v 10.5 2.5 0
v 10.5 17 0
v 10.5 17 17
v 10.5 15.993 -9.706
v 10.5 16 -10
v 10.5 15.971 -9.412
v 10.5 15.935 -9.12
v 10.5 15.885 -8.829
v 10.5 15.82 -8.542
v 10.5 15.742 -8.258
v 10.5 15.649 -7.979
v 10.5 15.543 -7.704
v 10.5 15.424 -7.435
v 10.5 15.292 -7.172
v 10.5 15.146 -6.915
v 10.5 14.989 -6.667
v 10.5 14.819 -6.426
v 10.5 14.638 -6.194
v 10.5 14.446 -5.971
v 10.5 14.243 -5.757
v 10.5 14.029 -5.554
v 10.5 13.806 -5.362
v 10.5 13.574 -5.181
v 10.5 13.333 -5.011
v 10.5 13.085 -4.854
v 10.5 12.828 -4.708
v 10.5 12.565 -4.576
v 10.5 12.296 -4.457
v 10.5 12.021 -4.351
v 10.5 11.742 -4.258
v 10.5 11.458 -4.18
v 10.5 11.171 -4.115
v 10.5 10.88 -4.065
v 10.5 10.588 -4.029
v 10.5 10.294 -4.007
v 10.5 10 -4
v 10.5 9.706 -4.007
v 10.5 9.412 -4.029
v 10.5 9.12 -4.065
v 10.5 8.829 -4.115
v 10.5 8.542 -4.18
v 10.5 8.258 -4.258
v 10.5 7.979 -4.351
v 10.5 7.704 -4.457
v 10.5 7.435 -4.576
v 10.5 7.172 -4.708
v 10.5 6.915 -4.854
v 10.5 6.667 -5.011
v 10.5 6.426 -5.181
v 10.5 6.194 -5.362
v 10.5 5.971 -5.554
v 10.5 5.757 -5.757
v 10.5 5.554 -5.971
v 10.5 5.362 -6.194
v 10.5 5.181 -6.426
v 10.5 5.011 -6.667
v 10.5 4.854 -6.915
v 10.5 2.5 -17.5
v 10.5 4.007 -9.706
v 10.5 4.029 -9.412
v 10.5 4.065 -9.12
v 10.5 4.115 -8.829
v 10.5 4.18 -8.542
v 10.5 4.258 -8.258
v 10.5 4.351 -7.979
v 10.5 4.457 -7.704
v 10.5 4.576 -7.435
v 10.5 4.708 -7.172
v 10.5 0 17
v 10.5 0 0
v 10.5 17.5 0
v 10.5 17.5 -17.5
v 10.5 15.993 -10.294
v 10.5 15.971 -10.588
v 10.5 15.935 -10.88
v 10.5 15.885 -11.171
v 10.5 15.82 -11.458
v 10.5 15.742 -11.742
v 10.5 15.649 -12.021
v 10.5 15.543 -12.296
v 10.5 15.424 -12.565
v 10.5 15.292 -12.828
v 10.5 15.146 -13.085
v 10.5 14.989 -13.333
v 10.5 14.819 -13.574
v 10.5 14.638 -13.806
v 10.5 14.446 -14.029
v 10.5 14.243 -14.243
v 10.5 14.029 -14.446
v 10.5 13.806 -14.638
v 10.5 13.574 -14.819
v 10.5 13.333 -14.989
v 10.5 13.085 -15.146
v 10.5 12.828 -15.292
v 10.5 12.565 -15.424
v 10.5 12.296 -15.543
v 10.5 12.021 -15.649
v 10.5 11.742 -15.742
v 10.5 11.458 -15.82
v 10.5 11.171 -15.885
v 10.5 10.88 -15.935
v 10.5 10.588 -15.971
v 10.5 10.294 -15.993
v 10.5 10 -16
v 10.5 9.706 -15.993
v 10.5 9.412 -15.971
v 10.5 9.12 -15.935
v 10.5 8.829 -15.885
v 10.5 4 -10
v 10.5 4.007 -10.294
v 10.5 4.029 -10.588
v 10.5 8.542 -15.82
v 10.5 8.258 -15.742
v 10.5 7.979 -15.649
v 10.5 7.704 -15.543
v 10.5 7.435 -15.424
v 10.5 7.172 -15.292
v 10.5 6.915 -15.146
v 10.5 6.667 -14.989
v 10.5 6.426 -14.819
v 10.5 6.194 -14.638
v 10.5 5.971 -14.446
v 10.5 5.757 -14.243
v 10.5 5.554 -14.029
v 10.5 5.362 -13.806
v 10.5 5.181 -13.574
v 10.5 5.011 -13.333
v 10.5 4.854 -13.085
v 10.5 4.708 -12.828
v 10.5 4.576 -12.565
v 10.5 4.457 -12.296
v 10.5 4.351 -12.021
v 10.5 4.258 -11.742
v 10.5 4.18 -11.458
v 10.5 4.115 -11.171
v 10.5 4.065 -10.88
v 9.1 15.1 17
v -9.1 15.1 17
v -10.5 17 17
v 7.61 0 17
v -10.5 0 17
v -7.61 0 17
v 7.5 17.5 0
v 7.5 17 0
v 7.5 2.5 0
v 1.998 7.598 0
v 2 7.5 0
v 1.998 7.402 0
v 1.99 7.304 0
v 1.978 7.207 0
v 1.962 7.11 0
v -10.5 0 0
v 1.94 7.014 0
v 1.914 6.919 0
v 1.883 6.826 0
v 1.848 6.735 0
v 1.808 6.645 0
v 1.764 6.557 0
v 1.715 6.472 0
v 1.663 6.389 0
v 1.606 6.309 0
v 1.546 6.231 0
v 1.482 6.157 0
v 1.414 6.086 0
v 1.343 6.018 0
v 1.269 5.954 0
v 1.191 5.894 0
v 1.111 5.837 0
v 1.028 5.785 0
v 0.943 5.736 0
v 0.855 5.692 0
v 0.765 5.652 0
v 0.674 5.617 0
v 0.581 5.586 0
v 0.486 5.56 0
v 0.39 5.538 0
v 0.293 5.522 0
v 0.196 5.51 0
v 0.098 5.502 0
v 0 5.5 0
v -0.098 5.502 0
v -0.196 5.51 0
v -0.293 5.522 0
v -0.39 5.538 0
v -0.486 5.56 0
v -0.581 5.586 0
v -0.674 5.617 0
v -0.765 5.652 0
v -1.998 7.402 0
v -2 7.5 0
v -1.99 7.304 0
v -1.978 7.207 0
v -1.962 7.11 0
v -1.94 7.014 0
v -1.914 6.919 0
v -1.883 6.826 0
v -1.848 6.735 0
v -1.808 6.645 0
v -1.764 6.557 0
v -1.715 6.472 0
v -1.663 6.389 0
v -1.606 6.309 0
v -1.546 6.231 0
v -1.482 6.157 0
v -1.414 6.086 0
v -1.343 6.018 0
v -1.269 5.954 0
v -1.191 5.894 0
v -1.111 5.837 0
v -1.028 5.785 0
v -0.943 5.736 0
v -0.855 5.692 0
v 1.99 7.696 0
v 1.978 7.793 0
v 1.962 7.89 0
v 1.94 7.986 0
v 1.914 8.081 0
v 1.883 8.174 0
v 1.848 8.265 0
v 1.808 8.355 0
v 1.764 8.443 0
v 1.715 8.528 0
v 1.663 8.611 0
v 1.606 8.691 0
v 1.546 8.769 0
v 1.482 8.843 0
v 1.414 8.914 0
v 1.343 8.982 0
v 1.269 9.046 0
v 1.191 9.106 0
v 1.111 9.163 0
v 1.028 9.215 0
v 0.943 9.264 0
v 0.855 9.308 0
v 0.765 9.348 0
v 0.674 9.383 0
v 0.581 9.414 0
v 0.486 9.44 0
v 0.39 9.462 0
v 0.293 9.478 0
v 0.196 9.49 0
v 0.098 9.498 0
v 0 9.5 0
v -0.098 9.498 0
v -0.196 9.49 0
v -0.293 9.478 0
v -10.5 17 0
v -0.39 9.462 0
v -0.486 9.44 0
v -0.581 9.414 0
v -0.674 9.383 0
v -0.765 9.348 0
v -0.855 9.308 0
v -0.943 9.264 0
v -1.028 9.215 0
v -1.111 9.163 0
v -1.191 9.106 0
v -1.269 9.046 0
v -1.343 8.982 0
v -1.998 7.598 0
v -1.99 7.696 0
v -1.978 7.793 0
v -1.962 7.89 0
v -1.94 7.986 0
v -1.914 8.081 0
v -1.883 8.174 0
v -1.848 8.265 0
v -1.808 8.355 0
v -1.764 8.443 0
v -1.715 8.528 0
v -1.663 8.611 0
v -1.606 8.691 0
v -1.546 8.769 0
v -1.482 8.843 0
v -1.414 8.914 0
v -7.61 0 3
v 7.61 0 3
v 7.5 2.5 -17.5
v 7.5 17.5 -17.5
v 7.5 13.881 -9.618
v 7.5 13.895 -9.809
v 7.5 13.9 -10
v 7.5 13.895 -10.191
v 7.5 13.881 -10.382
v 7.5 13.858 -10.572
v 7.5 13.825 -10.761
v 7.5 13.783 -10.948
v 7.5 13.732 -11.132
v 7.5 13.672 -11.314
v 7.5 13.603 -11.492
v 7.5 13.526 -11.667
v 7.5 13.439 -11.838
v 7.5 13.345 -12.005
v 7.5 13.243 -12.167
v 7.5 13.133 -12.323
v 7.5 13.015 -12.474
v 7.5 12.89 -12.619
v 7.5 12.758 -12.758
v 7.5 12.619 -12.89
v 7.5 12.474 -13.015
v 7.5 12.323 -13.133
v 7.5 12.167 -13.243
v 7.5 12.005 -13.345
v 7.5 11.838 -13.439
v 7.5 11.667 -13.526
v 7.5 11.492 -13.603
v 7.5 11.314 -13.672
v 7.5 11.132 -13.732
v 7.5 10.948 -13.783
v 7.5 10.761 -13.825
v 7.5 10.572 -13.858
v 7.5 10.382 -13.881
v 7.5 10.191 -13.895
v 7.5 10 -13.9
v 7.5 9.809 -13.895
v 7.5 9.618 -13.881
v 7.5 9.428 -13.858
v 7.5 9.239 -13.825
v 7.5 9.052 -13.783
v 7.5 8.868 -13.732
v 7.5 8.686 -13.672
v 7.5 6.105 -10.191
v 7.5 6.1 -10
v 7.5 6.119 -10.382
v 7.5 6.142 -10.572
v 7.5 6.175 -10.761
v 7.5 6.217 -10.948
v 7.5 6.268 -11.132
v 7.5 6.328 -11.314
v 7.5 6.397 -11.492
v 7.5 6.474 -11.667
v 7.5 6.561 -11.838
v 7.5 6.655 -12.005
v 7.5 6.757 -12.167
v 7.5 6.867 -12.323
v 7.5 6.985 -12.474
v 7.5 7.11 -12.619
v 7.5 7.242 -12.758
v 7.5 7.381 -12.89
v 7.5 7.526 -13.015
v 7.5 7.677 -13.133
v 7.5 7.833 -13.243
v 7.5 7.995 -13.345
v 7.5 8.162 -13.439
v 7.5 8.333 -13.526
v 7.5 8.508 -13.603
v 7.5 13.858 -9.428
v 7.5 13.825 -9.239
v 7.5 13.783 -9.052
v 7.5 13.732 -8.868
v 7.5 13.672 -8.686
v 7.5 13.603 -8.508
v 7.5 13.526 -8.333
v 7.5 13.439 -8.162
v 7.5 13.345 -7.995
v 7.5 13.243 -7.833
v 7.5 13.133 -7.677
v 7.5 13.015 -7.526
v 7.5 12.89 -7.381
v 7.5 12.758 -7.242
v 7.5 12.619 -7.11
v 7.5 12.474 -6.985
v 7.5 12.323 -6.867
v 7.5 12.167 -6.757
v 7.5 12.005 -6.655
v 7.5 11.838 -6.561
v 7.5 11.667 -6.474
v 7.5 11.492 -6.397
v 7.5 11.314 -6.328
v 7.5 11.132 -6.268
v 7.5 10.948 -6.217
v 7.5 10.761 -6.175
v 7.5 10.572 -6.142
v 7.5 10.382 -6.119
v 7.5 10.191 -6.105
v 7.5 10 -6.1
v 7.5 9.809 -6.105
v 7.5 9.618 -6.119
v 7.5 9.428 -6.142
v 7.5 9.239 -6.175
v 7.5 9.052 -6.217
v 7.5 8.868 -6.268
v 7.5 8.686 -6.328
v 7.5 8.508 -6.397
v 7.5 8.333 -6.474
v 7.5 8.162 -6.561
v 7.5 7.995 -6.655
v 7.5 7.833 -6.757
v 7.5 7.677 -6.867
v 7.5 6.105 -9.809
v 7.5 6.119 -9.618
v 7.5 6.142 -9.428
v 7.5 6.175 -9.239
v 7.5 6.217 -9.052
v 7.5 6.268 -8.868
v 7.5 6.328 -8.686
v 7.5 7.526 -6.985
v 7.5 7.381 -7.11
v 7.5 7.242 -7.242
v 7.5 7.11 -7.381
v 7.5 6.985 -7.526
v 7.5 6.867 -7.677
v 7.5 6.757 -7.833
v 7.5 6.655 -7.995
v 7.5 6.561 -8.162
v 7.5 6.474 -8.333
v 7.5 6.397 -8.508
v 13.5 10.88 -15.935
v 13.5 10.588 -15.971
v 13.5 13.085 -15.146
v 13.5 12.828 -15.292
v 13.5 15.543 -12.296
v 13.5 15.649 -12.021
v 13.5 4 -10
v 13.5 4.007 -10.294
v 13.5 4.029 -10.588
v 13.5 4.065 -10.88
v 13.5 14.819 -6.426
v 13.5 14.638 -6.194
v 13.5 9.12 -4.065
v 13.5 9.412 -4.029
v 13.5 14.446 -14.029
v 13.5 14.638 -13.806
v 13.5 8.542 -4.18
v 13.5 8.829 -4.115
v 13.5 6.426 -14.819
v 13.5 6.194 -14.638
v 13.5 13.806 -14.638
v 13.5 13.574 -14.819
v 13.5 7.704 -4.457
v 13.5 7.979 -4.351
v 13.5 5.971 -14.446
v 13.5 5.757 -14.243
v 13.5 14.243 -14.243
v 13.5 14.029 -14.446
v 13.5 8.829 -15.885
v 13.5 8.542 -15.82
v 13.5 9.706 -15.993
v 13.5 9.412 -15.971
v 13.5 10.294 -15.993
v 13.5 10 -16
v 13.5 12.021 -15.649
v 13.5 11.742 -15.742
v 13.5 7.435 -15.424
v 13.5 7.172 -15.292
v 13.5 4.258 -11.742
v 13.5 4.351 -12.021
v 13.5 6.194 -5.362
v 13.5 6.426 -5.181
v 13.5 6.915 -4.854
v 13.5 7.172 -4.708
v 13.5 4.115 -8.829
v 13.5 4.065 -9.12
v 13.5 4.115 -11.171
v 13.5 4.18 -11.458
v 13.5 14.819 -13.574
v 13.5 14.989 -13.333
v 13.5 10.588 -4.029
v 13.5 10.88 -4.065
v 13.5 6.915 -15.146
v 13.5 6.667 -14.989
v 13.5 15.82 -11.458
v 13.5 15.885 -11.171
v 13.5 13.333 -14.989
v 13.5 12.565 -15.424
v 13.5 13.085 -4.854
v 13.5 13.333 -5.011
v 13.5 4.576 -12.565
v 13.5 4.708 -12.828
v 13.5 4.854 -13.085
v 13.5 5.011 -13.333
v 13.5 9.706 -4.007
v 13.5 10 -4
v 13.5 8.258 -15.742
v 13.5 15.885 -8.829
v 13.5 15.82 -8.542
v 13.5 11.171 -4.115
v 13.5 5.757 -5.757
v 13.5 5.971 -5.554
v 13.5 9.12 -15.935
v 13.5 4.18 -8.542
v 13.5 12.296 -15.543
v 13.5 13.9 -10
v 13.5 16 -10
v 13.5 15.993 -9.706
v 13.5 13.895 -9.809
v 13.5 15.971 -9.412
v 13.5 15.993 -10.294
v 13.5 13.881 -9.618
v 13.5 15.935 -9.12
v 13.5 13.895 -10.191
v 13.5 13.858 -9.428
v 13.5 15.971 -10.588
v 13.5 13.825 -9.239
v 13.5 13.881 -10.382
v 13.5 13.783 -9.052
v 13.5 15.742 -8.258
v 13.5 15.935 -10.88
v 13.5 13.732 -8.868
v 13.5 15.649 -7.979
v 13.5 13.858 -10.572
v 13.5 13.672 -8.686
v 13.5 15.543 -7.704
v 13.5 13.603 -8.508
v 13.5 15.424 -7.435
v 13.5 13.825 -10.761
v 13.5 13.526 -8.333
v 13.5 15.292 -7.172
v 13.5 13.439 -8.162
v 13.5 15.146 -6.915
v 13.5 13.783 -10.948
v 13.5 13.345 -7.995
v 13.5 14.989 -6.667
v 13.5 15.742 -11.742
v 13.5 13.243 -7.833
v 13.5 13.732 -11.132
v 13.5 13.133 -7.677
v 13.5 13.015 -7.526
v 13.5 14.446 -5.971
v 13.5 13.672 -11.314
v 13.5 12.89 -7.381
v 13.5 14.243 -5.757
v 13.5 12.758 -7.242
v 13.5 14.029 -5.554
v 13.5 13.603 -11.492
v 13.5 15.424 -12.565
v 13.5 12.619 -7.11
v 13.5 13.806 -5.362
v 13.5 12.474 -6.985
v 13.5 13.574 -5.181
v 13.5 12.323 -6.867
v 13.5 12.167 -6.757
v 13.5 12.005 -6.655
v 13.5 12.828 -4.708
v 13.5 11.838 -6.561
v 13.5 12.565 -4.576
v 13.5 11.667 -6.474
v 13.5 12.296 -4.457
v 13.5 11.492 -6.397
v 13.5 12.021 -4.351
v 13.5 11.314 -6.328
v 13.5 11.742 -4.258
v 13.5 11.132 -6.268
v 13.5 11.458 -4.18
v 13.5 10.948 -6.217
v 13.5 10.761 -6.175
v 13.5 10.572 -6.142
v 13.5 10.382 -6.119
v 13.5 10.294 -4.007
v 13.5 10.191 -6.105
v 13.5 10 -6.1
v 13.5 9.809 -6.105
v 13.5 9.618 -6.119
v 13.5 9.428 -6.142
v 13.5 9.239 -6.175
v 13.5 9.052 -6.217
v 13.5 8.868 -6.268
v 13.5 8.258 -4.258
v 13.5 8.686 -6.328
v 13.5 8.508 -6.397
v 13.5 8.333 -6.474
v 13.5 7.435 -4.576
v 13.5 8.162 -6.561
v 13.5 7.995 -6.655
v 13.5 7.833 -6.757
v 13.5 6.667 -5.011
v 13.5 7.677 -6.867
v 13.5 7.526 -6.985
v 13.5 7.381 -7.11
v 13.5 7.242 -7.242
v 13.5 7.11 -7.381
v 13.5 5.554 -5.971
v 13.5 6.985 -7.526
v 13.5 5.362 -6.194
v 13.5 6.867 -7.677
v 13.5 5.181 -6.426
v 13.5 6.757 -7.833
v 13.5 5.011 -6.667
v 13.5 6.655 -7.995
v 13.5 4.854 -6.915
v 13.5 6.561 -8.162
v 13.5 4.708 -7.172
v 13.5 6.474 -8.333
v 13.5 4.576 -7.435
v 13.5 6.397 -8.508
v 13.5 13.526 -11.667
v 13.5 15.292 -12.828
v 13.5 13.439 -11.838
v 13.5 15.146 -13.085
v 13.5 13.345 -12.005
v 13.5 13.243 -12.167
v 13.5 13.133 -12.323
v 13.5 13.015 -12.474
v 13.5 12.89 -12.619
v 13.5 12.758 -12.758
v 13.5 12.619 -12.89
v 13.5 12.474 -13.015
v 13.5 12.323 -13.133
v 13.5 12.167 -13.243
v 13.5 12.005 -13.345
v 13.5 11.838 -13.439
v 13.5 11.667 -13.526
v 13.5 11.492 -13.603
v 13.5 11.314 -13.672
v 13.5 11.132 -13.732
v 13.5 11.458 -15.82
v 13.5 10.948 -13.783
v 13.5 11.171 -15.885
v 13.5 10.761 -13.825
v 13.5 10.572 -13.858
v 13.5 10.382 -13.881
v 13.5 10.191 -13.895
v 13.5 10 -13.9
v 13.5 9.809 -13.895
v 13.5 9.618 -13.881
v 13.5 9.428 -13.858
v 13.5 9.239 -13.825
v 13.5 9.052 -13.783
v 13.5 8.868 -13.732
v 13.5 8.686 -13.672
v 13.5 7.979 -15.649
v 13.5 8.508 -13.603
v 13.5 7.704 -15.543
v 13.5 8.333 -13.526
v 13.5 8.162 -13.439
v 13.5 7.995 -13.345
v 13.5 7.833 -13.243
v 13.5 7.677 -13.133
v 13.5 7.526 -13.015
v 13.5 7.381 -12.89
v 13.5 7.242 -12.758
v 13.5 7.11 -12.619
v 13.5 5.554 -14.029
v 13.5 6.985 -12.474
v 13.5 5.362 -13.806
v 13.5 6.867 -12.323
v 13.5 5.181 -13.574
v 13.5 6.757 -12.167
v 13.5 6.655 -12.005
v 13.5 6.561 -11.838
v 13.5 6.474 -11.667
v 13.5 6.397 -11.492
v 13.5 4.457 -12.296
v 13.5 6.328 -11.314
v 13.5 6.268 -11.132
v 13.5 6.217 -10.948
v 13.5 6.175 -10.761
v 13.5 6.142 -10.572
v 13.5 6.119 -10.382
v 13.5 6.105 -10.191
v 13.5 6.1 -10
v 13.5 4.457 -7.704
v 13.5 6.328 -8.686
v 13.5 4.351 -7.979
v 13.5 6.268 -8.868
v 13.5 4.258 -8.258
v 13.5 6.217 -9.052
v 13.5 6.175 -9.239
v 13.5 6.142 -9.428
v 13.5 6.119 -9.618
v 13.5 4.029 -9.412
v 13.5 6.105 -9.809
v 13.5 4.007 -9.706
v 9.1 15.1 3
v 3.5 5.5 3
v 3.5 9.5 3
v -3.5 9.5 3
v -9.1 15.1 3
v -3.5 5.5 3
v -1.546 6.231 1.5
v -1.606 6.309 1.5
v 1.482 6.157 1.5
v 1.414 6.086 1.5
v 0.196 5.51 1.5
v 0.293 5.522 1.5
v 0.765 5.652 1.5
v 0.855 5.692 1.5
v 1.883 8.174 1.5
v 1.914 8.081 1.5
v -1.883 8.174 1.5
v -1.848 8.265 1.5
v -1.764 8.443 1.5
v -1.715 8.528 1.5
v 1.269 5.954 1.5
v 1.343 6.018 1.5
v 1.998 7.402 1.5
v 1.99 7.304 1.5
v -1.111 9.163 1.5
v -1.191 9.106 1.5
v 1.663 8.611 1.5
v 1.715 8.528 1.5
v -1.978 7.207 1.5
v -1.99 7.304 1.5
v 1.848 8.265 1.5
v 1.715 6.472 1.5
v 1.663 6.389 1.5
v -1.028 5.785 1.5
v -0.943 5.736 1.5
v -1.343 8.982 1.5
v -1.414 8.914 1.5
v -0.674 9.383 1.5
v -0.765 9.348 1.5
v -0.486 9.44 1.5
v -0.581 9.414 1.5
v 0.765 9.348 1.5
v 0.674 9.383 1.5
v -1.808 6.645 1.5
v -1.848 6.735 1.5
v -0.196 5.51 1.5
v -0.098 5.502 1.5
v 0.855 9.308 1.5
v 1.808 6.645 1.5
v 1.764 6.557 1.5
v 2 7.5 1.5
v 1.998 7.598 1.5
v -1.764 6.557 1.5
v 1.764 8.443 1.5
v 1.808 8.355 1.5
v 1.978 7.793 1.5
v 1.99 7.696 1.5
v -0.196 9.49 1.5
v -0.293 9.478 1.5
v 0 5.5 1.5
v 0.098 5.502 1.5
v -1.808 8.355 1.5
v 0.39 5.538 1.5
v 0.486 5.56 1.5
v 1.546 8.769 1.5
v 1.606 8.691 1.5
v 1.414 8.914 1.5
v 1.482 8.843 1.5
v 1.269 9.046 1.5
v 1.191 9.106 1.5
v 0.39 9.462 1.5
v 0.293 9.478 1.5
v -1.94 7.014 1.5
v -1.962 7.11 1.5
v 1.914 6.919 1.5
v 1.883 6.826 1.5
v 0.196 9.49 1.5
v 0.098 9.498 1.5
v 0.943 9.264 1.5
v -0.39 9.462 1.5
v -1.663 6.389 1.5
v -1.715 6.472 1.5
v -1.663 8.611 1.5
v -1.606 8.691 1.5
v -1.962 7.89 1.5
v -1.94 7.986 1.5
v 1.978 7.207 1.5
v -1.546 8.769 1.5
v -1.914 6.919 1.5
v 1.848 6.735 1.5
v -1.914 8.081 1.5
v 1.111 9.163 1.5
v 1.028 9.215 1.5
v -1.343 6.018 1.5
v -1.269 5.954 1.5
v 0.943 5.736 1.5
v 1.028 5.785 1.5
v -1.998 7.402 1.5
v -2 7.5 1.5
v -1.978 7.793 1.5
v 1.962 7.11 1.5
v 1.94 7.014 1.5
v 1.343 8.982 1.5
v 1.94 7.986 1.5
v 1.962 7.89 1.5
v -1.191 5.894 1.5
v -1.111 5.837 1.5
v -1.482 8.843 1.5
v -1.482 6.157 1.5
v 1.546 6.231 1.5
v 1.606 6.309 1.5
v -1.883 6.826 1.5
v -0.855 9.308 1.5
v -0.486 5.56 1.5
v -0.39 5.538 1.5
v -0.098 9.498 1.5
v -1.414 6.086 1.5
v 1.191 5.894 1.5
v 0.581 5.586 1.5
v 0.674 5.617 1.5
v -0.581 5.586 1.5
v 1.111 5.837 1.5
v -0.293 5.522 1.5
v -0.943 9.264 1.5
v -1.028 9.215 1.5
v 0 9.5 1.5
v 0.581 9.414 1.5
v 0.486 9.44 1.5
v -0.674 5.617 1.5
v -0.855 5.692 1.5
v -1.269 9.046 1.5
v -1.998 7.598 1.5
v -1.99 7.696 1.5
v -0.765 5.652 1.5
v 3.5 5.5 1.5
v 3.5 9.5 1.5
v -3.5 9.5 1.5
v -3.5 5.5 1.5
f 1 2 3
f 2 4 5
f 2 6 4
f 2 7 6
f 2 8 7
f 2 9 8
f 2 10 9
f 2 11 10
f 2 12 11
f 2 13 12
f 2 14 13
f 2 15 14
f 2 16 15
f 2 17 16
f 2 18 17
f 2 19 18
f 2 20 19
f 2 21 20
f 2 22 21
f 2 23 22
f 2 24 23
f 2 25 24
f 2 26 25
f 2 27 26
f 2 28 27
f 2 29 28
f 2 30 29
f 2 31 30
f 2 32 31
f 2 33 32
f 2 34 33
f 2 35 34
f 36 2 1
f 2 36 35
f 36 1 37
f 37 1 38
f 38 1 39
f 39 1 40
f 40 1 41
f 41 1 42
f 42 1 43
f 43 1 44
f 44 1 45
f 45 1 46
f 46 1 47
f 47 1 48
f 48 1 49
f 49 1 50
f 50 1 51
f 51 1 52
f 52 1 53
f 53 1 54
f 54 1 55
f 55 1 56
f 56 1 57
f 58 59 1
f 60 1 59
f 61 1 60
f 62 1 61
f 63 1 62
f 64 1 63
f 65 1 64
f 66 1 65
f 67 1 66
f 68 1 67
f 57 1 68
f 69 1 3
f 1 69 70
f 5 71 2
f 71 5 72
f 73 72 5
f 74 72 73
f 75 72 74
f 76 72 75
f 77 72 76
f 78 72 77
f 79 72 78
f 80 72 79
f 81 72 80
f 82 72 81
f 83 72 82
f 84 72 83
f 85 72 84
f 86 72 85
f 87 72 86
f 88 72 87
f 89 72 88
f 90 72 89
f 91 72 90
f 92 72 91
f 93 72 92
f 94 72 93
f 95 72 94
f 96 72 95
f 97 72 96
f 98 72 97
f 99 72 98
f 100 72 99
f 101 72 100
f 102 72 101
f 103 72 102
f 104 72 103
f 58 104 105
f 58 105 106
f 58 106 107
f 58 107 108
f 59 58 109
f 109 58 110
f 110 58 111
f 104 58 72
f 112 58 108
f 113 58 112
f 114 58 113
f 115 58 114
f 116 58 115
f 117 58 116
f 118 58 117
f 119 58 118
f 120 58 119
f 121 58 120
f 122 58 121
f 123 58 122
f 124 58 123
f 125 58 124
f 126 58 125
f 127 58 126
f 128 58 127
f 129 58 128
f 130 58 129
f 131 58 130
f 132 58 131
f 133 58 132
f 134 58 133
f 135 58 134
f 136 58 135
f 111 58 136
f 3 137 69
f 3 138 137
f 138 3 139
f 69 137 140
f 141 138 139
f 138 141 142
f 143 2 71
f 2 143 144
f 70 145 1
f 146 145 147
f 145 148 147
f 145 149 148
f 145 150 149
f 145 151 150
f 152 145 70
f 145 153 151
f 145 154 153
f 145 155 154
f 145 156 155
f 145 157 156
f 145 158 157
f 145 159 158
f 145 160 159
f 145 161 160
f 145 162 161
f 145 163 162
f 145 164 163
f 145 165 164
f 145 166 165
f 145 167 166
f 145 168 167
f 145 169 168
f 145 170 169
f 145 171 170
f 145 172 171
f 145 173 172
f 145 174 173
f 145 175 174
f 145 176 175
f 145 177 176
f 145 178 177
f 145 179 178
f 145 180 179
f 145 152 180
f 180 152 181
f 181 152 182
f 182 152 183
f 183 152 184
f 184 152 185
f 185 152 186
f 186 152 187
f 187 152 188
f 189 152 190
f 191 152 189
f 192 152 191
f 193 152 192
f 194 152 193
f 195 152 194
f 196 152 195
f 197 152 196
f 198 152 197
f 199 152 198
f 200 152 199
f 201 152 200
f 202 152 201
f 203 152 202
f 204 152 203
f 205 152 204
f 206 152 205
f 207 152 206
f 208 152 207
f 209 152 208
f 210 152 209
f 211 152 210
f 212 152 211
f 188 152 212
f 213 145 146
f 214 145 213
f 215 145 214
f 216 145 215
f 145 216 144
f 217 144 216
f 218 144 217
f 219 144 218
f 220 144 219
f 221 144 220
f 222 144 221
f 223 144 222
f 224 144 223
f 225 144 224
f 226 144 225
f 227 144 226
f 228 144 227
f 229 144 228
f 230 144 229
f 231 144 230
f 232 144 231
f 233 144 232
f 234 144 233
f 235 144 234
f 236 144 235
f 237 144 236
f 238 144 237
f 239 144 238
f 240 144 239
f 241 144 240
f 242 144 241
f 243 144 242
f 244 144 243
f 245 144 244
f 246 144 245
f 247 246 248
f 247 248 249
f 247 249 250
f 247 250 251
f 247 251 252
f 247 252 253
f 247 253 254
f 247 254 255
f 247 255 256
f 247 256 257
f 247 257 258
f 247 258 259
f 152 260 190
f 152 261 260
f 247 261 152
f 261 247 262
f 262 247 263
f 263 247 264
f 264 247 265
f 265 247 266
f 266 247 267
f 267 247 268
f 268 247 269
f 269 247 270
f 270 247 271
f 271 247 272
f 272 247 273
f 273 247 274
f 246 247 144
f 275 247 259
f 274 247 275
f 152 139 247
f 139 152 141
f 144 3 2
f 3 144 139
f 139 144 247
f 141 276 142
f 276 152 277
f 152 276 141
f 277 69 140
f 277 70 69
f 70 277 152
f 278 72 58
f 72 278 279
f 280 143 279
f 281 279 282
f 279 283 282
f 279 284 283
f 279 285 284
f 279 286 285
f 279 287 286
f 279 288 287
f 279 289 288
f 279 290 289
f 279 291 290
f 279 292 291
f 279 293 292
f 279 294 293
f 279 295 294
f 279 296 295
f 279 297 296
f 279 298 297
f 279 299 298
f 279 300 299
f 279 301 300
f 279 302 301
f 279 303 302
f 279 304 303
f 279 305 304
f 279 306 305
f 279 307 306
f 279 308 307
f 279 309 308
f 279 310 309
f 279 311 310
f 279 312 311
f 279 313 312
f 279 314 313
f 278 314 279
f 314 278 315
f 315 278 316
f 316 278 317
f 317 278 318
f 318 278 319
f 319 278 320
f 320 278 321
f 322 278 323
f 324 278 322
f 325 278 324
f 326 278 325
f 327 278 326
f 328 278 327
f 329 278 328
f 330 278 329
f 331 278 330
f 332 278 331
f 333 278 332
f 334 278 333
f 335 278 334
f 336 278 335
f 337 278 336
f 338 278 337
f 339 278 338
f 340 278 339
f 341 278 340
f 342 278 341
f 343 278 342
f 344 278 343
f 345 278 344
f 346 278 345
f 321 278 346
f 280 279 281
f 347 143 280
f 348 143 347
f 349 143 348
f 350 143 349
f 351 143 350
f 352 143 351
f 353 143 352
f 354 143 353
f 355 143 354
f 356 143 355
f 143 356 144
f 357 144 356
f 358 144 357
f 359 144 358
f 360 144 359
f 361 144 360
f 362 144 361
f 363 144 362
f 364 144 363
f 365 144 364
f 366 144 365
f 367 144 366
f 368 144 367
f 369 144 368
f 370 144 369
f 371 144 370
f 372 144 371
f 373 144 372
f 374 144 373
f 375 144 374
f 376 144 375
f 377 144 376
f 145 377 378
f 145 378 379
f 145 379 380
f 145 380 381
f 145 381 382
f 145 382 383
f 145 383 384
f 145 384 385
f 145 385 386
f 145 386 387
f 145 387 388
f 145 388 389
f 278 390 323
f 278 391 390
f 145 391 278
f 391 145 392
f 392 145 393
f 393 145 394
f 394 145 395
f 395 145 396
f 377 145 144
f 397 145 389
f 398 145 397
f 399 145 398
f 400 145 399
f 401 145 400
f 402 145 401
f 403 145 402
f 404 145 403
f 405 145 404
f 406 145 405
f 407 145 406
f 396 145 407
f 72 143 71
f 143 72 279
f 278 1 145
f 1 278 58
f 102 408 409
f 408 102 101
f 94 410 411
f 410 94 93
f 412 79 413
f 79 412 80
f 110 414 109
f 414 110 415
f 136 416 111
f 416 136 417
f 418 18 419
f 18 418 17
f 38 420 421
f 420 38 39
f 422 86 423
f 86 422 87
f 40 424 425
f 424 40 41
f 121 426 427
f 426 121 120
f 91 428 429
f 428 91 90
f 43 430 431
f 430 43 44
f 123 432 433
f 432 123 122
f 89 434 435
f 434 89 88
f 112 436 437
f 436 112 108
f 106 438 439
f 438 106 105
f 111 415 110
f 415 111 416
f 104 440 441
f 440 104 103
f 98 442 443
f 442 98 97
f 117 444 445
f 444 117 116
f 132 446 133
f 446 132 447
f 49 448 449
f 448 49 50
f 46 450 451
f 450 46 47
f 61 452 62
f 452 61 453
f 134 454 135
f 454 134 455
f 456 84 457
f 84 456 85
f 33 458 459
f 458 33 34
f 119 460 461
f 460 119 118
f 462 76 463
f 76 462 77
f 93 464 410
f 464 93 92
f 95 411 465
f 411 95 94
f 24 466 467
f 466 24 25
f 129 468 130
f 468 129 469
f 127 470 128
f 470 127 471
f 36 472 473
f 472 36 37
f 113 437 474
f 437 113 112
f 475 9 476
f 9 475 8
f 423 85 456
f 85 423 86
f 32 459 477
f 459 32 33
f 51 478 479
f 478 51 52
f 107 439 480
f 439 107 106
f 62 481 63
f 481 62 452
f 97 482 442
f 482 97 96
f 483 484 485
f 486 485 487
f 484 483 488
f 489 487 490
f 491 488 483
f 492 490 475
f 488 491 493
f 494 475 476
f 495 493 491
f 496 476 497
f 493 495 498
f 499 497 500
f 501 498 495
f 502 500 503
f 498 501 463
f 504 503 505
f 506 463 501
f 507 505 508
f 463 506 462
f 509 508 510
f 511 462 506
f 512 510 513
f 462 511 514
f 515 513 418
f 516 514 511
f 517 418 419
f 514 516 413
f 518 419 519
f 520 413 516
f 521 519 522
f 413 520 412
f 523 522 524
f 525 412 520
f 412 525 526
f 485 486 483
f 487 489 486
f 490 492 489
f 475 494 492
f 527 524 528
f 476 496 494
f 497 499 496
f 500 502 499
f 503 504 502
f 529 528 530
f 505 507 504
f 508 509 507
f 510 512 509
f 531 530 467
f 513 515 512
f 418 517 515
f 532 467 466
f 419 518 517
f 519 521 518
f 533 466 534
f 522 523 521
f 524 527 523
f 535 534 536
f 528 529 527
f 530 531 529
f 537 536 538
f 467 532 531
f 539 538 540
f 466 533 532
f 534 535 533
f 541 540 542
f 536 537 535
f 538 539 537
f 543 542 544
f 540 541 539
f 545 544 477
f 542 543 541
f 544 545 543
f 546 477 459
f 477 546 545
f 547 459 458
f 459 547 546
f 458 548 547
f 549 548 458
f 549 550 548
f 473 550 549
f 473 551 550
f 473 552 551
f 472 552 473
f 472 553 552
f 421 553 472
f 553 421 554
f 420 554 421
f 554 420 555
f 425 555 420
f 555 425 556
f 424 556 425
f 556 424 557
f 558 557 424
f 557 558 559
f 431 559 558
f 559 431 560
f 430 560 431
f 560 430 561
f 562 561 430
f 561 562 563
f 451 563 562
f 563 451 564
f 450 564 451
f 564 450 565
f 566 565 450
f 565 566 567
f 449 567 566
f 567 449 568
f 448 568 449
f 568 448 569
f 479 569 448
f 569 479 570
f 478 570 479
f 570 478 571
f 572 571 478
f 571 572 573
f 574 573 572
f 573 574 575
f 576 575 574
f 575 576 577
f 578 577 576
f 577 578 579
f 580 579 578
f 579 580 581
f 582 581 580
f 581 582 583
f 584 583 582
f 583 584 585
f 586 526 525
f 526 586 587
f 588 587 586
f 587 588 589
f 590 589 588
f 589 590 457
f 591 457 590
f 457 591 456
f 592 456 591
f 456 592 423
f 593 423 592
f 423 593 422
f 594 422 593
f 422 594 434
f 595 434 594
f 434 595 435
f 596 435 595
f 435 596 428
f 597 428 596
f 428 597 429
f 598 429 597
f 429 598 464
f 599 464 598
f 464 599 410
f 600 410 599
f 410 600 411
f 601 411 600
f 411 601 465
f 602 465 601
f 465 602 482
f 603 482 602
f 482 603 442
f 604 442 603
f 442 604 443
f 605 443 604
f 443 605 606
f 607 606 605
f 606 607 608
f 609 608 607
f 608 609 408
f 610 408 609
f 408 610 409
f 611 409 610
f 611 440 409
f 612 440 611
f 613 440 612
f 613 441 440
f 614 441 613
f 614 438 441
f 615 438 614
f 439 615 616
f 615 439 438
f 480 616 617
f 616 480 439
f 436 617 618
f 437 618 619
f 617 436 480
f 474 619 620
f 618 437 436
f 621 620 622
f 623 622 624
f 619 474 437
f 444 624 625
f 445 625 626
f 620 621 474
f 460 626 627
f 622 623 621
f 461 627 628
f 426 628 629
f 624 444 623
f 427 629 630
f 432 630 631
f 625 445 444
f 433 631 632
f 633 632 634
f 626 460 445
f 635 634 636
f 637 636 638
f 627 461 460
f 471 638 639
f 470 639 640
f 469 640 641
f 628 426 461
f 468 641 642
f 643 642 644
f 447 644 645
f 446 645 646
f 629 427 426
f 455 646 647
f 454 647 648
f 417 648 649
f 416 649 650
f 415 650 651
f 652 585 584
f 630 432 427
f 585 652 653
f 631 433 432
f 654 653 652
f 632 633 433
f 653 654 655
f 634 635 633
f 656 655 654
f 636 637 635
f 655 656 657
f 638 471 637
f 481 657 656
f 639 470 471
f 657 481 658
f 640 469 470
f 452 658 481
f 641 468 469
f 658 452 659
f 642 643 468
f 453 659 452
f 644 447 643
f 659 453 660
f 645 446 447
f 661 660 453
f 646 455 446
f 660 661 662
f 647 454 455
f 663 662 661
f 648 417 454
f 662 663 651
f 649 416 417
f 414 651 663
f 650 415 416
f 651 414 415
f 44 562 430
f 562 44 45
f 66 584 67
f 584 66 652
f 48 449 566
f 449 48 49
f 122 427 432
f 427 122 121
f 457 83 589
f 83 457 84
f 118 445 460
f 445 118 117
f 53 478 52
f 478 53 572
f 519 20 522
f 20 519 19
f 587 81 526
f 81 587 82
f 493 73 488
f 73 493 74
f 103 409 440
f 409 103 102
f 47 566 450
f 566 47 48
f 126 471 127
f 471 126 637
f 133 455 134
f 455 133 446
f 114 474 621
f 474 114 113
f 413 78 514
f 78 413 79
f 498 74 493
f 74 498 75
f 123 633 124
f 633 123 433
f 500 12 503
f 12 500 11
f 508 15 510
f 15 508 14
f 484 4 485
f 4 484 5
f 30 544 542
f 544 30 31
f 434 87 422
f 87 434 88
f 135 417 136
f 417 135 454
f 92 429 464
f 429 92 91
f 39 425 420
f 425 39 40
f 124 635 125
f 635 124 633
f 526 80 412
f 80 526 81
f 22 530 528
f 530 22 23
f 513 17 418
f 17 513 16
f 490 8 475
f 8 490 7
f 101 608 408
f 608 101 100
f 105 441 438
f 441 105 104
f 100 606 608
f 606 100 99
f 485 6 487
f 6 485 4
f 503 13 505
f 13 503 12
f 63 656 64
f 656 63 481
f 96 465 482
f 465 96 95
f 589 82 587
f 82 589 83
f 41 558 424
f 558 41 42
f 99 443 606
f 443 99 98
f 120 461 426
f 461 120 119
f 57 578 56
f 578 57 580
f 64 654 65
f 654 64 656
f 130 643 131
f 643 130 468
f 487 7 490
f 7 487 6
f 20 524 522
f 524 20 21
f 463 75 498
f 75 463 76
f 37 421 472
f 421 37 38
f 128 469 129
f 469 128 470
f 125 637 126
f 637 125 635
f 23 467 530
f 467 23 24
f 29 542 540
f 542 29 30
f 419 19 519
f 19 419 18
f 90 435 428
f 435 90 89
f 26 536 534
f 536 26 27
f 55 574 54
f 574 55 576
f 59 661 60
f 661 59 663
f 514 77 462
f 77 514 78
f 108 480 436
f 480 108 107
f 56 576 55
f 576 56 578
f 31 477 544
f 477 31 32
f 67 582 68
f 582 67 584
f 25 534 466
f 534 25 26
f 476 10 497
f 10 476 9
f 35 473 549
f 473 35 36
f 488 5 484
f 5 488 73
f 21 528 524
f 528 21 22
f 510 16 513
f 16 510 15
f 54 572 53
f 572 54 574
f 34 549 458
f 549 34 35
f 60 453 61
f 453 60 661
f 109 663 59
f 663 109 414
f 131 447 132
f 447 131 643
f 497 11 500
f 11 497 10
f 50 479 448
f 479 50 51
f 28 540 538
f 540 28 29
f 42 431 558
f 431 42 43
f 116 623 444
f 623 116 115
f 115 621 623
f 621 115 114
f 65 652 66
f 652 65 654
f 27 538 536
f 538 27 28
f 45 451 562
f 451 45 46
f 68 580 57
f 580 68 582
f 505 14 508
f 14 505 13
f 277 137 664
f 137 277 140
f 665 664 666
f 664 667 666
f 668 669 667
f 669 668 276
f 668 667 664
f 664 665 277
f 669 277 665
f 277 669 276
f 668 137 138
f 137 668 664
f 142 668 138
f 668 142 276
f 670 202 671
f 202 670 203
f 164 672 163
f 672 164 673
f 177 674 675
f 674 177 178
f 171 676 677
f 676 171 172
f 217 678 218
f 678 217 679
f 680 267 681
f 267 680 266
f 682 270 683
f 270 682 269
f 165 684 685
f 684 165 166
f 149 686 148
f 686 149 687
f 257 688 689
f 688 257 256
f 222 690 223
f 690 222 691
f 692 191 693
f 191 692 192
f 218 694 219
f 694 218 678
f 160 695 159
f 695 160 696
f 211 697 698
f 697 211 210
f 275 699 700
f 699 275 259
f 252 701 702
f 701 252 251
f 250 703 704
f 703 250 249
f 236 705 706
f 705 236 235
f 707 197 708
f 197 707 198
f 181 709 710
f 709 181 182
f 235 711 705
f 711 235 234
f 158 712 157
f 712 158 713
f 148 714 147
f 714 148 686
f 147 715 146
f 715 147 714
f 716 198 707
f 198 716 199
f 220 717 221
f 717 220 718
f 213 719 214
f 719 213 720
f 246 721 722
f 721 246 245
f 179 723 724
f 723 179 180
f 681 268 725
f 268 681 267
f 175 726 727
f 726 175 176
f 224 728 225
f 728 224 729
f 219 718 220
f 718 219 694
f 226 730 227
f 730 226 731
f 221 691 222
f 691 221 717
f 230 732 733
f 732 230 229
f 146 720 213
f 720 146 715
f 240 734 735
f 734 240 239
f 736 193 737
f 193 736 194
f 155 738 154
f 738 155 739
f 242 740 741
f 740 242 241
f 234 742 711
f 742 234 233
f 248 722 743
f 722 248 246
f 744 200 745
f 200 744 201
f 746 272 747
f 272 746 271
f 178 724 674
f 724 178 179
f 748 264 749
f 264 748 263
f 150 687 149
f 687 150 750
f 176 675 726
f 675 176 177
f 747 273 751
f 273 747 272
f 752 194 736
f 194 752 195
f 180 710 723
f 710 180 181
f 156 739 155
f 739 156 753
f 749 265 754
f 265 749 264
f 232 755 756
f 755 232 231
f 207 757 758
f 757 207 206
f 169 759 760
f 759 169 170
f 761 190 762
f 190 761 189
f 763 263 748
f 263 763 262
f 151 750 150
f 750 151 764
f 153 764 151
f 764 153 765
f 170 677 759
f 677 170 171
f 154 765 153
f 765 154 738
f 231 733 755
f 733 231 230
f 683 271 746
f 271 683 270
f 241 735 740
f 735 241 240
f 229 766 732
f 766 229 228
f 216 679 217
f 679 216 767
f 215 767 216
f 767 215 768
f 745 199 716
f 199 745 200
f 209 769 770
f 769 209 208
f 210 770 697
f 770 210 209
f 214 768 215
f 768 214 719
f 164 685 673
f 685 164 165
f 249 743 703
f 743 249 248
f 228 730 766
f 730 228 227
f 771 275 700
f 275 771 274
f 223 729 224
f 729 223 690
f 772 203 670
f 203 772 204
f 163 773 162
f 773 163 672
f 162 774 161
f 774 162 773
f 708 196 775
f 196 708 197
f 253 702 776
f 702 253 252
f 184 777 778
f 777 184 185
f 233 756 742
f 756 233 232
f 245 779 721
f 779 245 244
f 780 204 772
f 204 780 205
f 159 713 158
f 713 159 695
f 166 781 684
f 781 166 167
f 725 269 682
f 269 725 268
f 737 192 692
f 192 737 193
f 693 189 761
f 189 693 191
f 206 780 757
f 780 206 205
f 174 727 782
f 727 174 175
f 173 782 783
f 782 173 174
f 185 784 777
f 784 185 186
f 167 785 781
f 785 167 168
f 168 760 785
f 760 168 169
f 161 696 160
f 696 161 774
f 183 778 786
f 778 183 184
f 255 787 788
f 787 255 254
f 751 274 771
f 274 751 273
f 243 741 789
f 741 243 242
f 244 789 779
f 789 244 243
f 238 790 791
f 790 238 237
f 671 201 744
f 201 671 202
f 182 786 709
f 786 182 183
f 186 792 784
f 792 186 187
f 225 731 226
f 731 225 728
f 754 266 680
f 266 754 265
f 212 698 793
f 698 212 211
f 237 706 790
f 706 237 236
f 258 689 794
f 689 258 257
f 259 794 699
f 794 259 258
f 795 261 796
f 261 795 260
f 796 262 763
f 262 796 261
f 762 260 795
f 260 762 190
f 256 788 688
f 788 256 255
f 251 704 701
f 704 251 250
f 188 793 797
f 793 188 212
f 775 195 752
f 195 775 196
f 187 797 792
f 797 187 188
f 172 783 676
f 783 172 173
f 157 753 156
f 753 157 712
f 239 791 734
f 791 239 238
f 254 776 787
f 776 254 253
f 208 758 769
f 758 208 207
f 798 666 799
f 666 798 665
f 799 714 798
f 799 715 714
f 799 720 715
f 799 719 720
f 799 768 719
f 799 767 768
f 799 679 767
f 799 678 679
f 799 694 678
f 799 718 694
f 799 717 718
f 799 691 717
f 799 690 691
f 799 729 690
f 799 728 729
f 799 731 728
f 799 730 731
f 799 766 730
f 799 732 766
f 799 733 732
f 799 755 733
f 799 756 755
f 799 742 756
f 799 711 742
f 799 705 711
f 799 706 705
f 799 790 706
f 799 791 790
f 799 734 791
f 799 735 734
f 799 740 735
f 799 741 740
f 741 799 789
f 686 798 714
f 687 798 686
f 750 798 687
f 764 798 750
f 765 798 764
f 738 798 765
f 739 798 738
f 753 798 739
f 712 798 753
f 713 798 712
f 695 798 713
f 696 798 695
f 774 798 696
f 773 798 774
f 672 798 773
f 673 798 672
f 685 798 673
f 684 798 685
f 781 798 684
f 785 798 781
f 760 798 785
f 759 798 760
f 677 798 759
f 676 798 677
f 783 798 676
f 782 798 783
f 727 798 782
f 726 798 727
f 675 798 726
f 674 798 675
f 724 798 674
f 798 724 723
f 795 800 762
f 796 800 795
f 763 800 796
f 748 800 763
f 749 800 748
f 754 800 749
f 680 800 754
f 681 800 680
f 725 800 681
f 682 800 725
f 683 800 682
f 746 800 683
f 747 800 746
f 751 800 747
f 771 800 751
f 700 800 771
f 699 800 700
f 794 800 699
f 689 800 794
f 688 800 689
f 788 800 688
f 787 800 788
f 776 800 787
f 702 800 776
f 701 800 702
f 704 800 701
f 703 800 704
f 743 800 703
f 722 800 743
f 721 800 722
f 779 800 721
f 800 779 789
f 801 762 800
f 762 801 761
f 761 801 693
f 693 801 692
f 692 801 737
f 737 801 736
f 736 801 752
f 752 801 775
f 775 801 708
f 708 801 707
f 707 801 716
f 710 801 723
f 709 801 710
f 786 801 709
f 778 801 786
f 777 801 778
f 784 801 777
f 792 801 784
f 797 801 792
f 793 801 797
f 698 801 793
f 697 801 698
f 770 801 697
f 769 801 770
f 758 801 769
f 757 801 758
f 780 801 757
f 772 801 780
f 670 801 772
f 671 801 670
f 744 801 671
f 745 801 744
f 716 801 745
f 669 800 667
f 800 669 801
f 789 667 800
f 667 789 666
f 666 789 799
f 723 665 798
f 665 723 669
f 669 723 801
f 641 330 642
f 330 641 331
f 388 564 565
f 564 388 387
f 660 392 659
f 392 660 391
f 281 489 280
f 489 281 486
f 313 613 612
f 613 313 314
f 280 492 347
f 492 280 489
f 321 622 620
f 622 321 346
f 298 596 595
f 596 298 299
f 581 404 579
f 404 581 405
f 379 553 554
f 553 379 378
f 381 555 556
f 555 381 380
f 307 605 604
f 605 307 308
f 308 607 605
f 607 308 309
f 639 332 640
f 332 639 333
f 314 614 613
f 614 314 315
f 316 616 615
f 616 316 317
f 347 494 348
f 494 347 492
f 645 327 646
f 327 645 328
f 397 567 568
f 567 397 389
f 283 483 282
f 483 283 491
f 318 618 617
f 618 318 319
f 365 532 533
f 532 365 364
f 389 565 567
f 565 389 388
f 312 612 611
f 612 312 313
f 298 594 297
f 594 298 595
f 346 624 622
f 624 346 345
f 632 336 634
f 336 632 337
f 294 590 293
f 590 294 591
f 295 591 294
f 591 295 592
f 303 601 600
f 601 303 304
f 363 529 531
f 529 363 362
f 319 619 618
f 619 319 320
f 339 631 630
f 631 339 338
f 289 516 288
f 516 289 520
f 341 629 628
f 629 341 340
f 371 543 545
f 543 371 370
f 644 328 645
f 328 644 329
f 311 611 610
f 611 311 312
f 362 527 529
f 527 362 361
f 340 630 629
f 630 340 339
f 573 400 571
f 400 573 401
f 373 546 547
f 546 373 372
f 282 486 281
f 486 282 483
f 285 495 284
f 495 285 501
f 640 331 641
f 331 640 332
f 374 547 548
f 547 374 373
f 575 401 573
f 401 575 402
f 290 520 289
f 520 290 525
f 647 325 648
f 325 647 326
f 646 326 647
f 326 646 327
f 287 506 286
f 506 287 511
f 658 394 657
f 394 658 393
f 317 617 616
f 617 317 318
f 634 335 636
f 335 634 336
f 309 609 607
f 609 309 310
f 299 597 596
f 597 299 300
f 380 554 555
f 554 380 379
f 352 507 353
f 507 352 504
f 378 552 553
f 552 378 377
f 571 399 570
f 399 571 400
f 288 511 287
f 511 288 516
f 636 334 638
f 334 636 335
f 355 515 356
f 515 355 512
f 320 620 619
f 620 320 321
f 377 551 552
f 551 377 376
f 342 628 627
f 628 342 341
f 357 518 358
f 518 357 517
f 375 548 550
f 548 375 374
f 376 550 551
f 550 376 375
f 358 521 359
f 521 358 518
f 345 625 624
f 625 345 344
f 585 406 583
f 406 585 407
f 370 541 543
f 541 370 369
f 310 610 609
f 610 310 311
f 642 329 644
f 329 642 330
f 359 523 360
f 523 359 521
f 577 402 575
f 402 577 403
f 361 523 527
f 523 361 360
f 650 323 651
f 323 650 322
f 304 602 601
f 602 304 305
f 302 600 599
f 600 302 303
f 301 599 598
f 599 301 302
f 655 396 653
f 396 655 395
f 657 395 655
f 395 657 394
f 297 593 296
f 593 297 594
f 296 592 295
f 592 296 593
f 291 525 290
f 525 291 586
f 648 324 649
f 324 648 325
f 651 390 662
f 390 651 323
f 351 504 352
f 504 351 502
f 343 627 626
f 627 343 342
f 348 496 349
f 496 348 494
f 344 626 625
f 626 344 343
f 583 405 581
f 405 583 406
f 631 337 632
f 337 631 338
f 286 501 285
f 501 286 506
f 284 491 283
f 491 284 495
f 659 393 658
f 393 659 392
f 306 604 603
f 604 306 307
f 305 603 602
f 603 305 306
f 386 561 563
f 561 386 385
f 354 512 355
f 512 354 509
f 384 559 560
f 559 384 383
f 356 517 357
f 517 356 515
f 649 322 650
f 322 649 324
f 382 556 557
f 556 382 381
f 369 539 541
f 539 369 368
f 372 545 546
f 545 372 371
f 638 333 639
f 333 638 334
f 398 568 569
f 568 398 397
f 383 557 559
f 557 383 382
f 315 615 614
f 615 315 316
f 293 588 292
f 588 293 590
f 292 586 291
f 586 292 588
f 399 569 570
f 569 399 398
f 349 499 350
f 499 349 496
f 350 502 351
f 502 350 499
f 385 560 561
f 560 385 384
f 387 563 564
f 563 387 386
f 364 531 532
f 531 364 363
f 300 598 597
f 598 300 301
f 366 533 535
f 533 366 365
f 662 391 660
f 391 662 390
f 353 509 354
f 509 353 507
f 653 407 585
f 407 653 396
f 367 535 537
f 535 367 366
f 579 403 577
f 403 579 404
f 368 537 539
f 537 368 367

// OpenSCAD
// file: Pieces.scad
$fn = 128;

module end_cap() {
    difference() {
        union() {
            for (i = [ 0 : 3 ]) {
                rotate([0, 0, i * 90]) {
                    translate([0,0,2.5]) linear_extrude(5)
                        polygon(points=[[-2.5,3.75],[-5.5,8],[-3,8],[-3, 10],
                                        [3,10],[3,8],[5.5,8],[2.5, 3.75]]);
                }
            }
            translate([-10,-10,0]) cube([20,20,2.5]);
            translate([-12.5,-10,0]) cube([2.5,20,22.5]);
            translate([-12.5,10,0]) cube([22.5,2.5,22.5]);
        }
        cylinder(20, 3, 3, center=true);
        translate([0,0,15]) rotate([90,0,0]) cylinder(40, 3, 3, center=true);
        translate([0,0,15]) rotate([0,90,0]) cylinder(40, 3, 3, center=true);
    }
}

module runner_cap() {
    union () {
        end_cap();
        translate([-27.5,-10,0]) difference() {
            translate([0,2.5, 0]) cube([15,15,10]);
            translate([5, 10, 7.5]) cylinder(10, 4.1, 4.1, center=true);
        }
        translate([-10,-30,0]) difference() {
            cube([20,20,2.5]);
            translate([10, 10, 0]) cylinder(10, 3, 3, center=true);
        }
        translate([-12.5, -10, 0]) rotate([0, 90, 0]) linear_extrude(2.5)
            polygon(points=[[0,0],[0,-20],[-2.5, -20], [-22.5, 0]]);
    }
}

module motor_bracket() {
    difference() {
        translate([0,0,0]) cube([44, 7, 42]);
        union() {
            translate([-1,5,9.5]) cube([24, 3, 23]);
            translate([-1,-1,17.5]) cube([24, 9, 7]);
            translate([23,9, 21]) rotate([90,0,0]) cylinder(4, 11.5, 11.5);
            translate([23,6, 21]) rotate([90,0,0]) cylinder(7, 3.5, 3.5);

            translate([6.5,-1, 5]) rotate([-90,0,0]) {
                cylinder(9, 2, 2);
                cylinder(3, 3.5, 3.5);
            }
            translate([6.5,-1, 36]) rotate([-90,0,0]) {
                cylinder(9, 2, 2);
                cylinder(3, 3.5, 3.5);
            }
            translate([37.5,-1, 5]) rotate([-90,0,0]) {
                cylinder(9, 2, 2);
                cylinder(3, 3.5, 3.5);
            }
            translate([37.5,-1, 36]) rotate([-90,0,0]) {
                cylinder(9, 2, 2);
                cylinder(3, 3.5, 3.5);
            }
        }
    }
}

module belt_bracket() {
    difference() {
        cube([30, 10, 10]);
        difference() {
            union() {
                translate([10, 8, 5]) rotate([90,0,0]) cylinder(9, 4, 4);
                translate([20, 8, 5]) rotate([90,0,0]) cylinder(9, 4, 4);
                translate([-1, -1, 1]) cube([11, 9, 8]);
                translate([20, -1, 1]) cube([11, 9, 8]);
            }

            union() {
                translate([10, 8, 5]) rotate([90,0,0]) cylinder(9, 2.5, 2.5);
                translate([20, 8, 5]) rotate([90,0,0]) cylinder(9, 2.5, 2.5);
                translate([-1, -1, 2.5]) cube([11, 9, 5]);
                translate([20, -1, 2.5]) cube([11, 9, 5]);
            }
        }
    }

    for(i = [0:5])
        translate([i*2, 8, 1]) rotate([90,0,0]) linear_extrude(8) polygon([[0,0], [1,0], [1,1.0]]);
    for(i = [0:5])
        translate([30-i*2, 0, 1]) rotate([90,0,180]) linear_extrude(8) polygon([[0,0], [1,0], [1,1.0]]);
}

belt_bracket();
// main file
use <Pieces.scad>
$fn = 128;

module pulley_mount() {    
    difference() {
        union () {
            translate([-10.5, 0,0]) cube([21,17,17]);
            translate([7.5,2.5,-17.5]) cube([3,15,17.5]);
            translate([10.5, 10, -10])  rotate([0,90,0]) cylinder(3,6,6);
        }
        union() {
            translate([0,0,3]) linear_extrude(15)
                polygon([[-7.6, -0.1], [7.6,-0.1], [9.1,15.1], [-9.1, 15.1]]);
            translate([0,7.5,-1])  cylinder(6,2,2);
            translate([0,7.5,3])  cube([7,4,3], center = true);
            translate([0,10,-10])  rotate([0,90,0]) cylinder(15,3.9,3.9);
        }
    }
}

pulley_mount();
